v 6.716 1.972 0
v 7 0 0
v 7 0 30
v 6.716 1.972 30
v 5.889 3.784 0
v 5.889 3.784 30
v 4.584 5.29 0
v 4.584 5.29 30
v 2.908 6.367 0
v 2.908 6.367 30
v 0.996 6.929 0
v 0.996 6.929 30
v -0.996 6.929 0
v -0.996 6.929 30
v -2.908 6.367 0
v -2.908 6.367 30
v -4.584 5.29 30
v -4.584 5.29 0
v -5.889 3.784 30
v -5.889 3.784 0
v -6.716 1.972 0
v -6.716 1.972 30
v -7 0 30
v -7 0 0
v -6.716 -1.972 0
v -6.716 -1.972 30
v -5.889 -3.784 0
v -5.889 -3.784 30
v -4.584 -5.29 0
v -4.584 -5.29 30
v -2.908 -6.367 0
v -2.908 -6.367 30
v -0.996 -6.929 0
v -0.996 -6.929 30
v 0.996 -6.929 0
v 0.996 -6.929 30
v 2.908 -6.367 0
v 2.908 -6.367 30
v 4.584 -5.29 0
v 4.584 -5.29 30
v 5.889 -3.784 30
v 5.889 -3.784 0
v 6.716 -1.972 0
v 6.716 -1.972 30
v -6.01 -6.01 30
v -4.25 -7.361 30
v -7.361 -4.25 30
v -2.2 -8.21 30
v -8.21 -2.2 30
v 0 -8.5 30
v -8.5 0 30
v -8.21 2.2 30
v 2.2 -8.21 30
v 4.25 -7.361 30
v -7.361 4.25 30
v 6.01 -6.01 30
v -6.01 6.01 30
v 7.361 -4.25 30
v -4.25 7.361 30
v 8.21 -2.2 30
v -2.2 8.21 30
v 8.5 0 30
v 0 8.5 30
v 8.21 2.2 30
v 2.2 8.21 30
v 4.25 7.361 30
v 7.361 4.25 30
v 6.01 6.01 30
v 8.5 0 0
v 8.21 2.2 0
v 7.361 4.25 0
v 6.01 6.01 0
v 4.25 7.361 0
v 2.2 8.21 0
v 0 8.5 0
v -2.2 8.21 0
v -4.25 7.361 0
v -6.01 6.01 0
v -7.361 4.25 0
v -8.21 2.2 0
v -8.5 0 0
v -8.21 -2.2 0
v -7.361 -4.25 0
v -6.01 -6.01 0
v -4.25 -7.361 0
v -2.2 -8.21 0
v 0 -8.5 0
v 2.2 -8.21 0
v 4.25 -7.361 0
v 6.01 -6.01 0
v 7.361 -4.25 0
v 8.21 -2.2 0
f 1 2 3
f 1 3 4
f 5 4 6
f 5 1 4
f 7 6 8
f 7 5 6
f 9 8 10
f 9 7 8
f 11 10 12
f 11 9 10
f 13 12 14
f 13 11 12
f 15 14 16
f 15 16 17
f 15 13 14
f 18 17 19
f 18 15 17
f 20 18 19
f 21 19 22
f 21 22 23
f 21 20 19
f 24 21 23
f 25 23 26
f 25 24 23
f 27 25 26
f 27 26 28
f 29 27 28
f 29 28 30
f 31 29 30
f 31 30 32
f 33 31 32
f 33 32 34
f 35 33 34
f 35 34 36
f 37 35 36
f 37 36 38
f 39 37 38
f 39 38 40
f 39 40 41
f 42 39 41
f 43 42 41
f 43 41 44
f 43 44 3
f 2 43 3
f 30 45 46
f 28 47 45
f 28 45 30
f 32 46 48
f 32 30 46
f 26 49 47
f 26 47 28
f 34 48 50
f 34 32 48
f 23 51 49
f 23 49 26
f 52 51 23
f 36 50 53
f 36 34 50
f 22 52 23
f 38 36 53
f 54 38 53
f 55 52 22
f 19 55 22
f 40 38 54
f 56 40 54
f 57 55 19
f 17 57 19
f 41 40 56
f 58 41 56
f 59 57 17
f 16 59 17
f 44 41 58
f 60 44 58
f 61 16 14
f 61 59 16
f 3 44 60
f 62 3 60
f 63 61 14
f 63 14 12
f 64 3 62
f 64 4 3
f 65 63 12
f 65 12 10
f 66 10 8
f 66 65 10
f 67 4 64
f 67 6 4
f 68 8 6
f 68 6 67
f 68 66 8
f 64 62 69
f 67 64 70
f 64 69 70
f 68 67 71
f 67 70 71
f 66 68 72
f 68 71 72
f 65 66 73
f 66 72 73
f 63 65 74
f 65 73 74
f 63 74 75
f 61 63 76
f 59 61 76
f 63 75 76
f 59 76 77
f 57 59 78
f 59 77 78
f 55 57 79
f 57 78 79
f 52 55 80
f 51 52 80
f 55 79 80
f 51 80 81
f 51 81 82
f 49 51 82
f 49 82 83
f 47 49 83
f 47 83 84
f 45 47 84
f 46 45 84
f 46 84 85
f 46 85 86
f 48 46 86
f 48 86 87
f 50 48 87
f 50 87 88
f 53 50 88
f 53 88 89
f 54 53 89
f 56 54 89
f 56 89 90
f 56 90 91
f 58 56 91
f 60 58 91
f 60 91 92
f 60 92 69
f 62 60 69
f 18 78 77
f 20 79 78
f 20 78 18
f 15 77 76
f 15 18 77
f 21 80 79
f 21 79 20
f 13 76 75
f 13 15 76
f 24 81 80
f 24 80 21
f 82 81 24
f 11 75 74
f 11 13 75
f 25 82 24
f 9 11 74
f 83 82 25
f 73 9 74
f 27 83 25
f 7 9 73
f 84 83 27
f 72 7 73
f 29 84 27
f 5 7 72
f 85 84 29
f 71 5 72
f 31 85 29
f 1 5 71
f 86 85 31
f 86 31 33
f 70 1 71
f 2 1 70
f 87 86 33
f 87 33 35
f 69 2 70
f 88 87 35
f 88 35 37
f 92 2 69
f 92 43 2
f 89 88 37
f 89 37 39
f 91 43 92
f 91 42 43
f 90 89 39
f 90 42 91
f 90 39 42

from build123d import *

# Parameters (mm, degrees)
F0_R           = 8.5
F0_R_2         = 7
F1_DEPTH       = 30
F2_R           = 20
F3_DEPTH       = 34
F5_D           = 14
F5_CSINK_D     = 40
F5_CSINK_ANGLE = 47
F6_SIZE2       = 10.919107028
F6_SIZE        = 30
F7_SIZE2       = 0.5
F7_SIZE        = 0.7140740034
F8_W           = 87.9276357591
F8_H           = 44.8519736528
F9_DEPTH       = 20.001
F10_DEPTH      = 20.001


with BuildPart() as f1:
    # F0 (on Top) → F1 (new body)
    with BuildSketch(Plane.XY):
        Circle(F0_R)
        Circle(F0_R_2, mode=Mode.SUBTRACT)
    extrude(amount=F1_DEPTH)

    # F2 (on face) → F3 (join)
    with BuildSketch(Plane(origin=(0, 0, 0), x_dir=(1, 0, 0), z_dir=(0, 0, -1))):
        Circle(F2_R)
    extrude(amount=F3_DEPTH)

    # F5 (through all)
    with Locations(Plane(origin=(0, 0, -34), x_dir=(1, 0, 0), z_dir=(0, 0, -1))):
        with Locations((0, 0)):
            CounterSinkHole(F5_D / 2, F5_CSINK_D / 2, counter_sink_angle=F5_CSINK_ANGLE)

    # F6
    f6_edges = [f1.edges().sort_by_distance(p)[0] for p in [
        (-20, 0, 0),
    ]]
    f6_side = f1.faces().sort_by_distance((-20, 0, -17))[0]
    chamfer(f6_edges, length=F6_SIZE, length2=F6_SIZE2, reference=f6_side)

    # F7
    f7_edges = [f1.edges().sort_by_distance(p)[0] for p in [
        (-9.080893, 0, 0),
    ]]
    f7_side = f1.faces().sort_by_distance((-14.540446, 0, -15))[0]
    chamfer(f7_edges, length=F7_SIZE, length2=F7_SIZE2, reference=f7_side)

    # F8 (on Front) → F9 (cut, through all)
    with BuildSketch(Plane.XZ):
        with Locations((9.7697358578, -22.4259868264)):
            Rectangle(F8_W, F8_H)
    extrude(amount=-F9_DEPTH, mode=Mode.SUBTRACT)

    # F8 (on Front) → F10 (cut, through all)
    with BuildSketch(Plane.XZ):
        with Locations((9.7697358578, -22.4259868264)):
            Rectangle(F8_W, F8_H)
    extrude(amount=F10_DEPTH, mode=Mode.SUBTRACT)


solid = f1.part
